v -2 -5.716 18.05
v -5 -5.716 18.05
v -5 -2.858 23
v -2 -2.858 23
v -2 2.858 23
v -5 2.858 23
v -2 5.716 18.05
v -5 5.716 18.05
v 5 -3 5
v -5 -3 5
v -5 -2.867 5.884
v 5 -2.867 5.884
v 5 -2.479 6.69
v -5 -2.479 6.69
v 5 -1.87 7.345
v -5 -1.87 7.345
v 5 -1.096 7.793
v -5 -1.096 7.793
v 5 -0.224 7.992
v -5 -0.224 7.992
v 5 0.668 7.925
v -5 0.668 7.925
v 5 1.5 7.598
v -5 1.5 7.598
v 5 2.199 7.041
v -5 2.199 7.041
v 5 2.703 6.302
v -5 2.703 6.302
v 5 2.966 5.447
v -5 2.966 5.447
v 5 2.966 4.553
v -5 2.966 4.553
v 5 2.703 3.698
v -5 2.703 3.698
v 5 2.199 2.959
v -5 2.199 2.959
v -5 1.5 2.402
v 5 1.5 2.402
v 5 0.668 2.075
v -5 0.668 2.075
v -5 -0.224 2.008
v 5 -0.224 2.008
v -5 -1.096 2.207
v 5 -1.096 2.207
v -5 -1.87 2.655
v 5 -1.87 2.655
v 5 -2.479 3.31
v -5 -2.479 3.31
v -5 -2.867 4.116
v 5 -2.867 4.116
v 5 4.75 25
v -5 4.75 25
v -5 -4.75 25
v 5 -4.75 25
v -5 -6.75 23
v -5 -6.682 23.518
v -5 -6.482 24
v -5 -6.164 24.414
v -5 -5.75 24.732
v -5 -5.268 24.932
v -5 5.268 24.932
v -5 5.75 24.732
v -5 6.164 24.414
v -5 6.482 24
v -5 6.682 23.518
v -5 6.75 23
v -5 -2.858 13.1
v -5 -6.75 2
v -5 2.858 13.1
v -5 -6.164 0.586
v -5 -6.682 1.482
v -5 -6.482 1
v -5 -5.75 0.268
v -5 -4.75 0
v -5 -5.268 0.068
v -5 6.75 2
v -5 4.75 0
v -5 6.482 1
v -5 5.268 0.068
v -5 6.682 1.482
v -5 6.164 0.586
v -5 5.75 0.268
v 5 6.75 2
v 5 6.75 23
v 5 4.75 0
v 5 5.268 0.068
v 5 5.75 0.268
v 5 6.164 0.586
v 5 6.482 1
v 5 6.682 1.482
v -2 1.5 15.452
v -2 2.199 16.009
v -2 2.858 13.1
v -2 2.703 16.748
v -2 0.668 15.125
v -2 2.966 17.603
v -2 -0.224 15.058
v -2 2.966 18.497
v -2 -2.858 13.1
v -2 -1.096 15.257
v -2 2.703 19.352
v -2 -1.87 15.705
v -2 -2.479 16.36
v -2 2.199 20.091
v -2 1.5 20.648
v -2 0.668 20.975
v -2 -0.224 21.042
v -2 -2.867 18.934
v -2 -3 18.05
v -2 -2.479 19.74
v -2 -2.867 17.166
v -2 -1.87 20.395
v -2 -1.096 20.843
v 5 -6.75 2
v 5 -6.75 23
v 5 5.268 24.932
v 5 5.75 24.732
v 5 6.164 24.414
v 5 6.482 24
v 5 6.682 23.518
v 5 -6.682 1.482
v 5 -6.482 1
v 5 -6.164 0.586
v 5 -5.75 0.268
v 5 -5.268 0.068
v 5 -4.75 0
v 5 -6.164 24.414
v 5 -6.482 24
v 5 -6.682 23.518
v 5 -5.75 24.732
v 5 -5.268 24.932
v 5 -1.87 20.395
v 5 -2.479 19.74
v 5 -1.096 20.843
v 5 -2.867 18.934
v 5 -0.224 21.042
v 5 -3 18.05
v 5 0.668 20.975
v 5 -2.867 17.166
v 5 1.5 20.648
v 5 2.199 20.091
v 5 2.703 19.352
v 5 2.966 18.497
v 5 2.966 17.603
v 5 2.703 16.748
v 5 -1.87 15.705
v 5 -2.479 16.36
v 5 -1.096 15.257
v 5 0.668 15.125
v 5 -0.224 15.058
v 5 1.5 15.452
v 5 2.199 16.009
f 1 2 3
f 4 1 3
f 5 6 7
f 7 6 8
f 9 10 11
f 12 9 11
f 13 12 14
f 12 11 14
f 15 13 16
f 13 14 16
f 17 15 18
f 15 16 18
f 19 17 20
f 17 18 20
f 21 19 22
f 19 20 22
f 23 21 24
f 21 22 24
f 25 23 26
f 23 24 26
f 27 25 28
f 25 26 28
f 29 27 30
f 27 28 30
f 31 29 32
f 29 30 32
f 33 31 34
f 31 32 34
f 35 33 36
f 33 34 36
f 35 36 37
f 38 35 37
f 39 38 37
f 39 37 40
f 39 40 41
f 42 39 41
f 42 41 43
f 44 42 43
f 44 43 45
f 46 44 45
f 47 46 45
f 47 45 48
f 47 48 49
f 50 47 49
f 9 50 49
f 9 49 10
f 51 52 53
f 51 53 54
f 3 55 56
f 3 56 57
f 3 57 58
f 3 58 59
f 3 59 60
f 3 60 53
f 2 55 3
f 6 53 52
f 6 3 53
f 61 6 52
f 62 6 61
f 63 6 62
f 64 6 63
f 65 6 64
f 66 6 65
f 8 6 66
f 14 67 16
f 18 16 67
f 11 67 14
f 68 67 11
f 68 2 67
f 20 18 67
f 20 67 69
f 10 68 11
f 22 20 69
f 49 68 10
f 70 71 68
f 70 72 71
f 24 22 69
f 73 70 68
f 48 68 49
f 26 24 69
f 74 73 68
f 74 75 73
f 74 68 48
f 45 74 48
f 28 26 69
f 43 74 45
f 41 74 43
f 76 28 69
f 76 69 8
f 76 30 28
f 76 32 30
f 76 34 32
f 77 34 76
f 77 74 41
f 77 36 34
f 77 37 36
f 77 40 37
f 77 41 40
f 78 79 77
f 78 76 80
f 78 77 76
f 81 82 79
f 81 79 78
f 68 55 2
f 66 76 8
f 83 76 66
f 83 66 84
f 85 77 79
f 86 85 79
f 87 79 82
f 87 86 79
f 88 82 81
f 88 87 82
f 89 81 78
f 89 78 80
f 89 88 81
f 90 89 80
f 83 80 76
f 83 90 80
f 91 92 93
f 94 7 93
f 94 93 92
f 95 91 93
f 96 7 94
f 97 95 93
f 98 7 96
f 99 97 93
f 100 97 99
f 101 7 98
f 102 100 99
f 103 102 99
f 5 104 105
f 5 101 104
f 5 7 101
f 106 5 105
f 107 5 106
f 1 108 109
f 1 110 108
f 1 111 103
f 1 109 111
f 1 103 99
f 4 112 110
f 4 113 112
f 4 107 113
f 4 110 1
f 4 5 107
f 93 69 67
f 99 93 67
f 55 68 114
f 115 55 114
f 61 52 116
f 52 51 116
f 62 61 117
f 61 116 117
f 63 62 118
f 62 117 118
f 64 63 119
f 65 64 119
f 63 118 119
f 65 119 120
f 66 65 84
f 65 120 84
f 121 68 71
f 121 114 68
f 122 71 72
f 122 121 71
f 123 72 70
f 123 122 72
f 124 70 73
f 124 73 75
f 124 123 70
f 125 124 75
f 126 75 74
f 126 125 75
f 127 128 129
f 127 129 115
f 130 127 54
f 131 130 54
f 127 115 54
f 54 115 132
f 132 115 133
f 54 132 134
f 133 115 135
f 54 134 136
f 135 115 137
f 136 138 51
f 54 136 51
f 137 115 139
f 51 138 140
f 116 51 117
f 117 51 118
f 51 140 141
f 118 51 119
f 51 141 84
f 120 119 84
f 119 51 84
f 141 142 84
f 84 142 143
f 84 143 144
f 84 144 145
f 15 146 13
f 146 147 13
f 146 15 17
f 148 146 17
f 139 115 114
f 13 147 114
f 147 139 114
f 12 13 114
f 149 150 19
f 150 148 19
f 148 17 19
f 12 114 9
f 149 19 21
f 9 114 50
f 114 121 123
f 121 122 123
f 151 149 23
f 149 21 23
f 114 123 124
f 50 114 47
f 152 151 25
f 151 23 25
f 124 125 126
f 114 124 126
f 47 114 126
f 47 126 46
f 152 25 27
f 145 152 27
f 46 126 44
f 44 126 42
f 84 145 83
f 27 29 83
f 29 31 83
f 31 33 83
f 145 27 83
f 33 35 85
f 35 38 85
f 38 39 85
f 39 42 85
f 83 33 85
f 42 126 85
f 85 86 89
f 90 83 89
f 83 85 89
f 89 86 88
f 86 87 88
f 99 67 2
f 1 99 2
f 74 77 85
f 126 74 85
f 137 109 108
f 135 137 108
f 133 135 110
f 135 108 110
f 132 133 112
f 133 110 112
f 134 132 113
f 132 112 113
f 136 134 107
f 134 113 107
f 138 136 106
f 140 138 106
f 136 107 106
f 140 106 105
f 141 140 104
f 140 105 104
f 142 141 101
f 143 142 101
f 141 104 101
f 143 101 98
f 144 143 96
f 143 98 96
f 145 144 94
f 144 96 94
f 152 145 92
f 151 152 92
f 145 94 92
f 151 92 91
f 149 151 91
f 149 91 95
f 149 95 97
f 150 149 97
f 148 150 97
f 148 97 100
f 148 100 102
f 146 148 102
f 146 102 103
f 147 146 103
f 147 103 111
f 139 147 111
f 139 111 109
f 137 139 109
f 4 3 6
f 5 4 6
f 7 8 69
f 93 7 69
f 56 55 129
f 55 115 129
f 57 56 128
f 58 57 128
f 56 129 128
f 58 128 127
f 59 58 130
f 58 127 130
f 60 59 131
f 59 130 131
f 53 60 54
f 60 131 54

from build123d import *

# Parameters (mm, degrees)
F0_W     = 10
F0_H     = 13.5
F1_DEPTH = 25
F2_R     = 3
F3_DEPTH = 3
F4_DEPTH = 25
F5_R     = 2


with BuildPart() as f1:
    # F0 (on Top) → F1 (new body)
    with BuildSketch(Plane.XY):
        Rectangle(F0_W, F0_H)
    extrude(amount=F1_DEPTH)

    # F2 (on face) → F3 (cut)
    with BuildSketch(Plane(origin=(-5, 0, 0), x_dir=(0, -1, 0), z_dir=(-1, 0, 0))):
        Polygon((2.857884, 23), (-2.857884, 23), (-5.715768, 18.05), (-2.857884, 13.1), (2.857884, 13.1), (5.715768, 18.05), align=None)
        with Locations((0, 18.05)):
            Circle(F2_R, mode=Mode.SUBTRACT)
    extrude(amount=-F3_DEPTH, mode=Mode.SUBTRACT)

    # F2 (on face) → F4 (cut)
    with BuildSketch(Plane(origin=(-5, 0, 0), x_dir=(0, -1, 0), z_dir=(-1, 0, 0))):
        with Locations((0, 5)):
            Circle(F2_R)
        with Locations((0, 18.05)):
            Circle(F2_R)
    extrude(amount=-F4_DEPTH, mode=Mode.SUBTRACT)

    # F5
    f5_edges = [f1.edges().sort_by_distance(p)[0] for p in [
        (0, -6.75, 25),
        (0, 6.75, 25),
        (0, -6.75, 0),
        (0, 6.75, 0),
    ]]
    fillet(f5_edges, radius=F5_R)


solid = f1.part
